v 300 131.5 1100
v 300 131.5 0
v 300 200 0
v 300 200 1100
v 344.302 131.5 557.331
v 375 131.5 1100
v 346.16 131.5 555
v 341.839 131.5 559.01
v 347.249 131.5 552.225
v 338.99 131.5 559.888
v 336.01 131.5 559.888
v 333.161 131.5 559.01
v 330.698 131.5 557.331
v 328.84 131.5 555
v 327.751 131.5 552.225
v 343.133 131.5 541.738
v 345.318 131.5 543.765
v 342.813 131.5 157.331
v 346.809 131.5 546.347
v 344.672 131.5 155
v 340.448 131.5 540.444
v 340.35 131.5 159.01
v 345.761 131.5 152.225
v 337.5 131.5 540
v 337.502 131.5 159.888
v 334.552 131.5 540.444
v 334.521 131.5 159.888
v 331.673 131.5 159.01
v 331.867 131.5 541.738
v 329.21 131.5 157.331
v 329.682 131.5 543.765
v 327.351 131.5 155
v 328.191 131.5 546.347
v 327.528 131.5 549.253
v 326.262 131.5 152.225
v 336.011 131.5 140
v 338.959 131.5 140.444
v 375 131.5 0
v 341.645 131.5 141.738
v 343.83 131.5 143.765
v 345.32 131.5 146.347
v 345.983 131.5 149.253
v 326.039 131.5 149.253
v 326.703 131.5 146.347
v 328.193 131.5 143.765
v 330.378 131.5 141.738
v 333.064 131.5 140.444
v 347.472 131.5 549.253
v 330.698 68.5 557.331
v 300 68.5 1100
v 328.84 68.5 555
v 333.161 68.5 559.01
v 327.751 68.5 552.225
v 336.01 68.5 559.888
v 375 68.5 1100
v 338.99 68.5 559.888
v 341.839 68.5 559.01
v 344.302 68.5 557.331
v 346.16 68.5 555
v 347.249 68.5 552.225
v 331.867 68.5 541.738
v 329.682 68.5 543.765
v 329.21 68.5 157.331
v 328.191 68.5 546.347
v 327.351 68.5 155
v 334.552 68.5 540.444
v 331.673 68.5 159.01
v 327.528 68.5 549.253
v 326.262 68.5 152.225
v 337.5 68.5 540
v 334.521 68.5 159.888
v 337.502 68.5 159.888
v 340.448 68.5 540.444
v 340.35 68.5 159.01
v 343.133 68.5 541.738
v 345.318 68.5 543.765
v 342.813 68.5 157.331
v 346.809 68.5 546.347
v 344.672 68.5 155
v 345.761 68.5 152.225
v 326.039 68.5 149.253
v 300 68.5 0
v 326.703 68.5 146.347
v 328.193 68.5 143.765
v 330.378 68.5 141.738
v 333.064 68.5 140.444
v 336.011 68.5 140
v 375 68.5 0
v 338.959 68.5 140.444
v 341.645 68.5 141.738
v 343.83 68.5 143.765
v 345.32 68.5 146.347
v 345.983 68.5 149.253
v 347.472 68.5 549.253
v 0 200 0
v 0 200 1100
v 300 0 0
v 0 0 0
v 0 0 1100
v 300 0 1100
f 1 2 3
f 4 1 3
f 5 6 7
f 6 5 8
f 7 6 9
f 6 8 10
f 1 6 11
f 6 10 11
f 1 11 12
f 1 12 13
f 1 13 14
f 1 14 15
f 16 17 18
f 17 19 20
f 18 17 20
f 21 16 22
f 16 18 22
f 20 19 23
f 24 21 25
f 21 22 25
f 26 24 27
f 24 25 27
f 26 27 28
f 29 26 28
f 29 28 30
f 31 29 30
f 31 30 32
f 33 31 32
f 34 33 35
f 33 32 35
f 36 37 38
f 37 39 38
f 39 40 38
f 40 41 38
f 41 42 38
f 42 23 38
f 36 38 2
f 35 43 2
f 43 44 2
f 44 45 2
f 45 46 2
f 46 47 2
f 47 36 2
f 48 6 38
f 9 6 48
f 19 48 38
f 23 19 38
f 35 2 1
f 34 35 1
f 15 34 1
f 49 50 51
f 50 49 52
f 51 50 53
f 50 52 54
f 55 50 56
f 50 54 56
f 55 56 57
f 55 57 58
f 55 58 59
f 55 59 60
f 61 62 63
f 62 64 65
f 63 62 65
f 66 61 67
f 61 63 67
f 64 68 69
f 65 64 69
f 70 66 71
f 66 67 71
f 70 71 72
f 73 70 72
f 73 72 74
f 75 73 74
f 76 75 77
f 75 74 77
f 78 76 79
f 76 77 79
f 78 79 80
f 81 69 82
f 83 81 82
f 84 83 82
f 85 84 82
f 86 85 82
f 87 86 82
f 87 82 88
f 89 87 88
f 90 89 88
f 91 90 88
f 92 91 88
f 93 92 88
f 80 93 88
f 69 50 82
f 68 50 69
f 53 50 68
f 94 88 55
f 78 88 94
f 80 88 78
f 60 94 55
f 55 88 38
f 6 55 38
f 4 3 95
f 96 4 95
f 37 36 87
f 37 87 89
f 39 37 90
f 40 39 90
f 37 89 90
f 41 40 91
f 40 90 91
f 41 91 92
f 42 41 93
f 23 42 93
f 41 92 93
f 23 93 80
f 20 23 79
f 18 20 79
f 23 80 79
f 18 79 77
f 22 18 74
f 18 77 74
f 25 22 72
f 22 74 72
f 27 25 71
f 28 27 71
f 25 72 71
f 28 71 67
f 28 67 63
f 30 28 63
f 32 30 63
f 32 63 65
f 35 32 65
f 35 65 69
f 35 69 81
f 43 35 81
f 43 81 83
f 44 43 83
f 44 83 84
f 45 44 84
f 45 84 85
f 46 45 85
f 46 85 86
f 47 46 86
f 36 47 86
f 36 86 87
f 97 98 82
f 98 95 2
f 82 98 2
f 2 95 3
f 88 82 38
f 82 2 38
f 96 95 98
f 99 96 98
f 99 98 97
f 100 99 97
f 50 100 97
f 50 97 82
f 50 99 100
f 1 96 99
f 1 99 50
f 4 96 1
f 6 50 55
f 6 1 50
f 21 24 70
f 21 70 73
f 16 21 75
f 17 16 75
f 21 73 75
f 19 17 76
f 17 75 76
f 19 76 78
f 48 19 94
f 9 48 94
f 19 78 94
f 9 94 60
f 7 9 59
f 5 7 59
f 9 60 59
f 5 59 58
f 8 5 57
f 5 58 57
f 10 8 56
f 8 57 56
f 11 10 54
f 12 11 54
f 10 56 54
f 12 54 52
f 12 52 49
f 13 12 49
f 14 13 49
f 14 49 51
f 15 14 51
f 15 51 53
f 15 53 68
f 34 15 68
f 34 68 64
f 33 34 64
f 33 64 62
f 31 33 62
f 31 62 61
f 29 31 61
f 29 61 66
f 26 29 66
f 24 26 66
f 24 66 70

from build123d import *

# Parameters (mm, degrees)
BOSS_EXTRU_1_DEPTH      = 1100
ENL_V_MAT_EXTRU_1_REACH = 1171.58
ESQUISSE2_R             = 10
ENL_V_MAT_EXTRU_2_REACH = 1171.58
ESQUISSE3_R             = 10


with BuildPart() as part:
    # Esquisse1 → Boss.-Extru.1 (new body)
    with BuildSketch(Plane.XY):
        Polygon((0, 0), (300, 0), (300, 68.5), (375, 68.5), (375, 131.5), (300, 131.5), (300, 200), (0, 200), align=None)
    extrude(amount=BOSS_EXTRU_1_DEPTH)

    # Esquisse2 → Enlèv. mat.-Extru.1 (cut, up to next)
    with BuildSketch(Plane.XZ.offset(-68.5), mode=Mode.PRIVATE) as enl_v_mat_extru_1_sk1:
        with Locations(Location((337.5, 550, 0), (0, 0, 270))):
            Circle(ESQUISSE2_R)
    enl_v_mat_extru_1_tool1 = extrude(enl_v_mat_extru_1_sk1.sketch, amount=-ENL_V_MAT_EXTRU_1_REACH, mode=Mode.PRIVATE) & part.part
    add(enl_v_mat_extru_1_tool1.solids().sort_by_distance((337.5, 68.5, 550))[0], mode=Mode.SUBTRACT)

    # Esquisse3 → Enlèv. mat.-Extru.2 (cut, up to next)
    with BuildSketch(Plane.XZ.offset(-68.5), mode=Mode.PRIVATE) as enl_v_mat_extru_2_sk1:
        with Locations(Location((336.011391588, 150, 0), (0, 0, 270))):
            Circle(ESQUISSE3_R)
    enl_v_mat_extru_2_tool1 = extrude(enl_v_mat_extru_2_sk1.sketch, amount=-ENL_V_MAT_EXTRU_2_REACH, mode=Mode.PRIVATE) & part.part
    add(enl_v_mat_extru_2_tool1.solids().sort_by_distance((336.011392, 68.5, 150))[0], mode=Mode.SUBTRACT)


solid = part.part
